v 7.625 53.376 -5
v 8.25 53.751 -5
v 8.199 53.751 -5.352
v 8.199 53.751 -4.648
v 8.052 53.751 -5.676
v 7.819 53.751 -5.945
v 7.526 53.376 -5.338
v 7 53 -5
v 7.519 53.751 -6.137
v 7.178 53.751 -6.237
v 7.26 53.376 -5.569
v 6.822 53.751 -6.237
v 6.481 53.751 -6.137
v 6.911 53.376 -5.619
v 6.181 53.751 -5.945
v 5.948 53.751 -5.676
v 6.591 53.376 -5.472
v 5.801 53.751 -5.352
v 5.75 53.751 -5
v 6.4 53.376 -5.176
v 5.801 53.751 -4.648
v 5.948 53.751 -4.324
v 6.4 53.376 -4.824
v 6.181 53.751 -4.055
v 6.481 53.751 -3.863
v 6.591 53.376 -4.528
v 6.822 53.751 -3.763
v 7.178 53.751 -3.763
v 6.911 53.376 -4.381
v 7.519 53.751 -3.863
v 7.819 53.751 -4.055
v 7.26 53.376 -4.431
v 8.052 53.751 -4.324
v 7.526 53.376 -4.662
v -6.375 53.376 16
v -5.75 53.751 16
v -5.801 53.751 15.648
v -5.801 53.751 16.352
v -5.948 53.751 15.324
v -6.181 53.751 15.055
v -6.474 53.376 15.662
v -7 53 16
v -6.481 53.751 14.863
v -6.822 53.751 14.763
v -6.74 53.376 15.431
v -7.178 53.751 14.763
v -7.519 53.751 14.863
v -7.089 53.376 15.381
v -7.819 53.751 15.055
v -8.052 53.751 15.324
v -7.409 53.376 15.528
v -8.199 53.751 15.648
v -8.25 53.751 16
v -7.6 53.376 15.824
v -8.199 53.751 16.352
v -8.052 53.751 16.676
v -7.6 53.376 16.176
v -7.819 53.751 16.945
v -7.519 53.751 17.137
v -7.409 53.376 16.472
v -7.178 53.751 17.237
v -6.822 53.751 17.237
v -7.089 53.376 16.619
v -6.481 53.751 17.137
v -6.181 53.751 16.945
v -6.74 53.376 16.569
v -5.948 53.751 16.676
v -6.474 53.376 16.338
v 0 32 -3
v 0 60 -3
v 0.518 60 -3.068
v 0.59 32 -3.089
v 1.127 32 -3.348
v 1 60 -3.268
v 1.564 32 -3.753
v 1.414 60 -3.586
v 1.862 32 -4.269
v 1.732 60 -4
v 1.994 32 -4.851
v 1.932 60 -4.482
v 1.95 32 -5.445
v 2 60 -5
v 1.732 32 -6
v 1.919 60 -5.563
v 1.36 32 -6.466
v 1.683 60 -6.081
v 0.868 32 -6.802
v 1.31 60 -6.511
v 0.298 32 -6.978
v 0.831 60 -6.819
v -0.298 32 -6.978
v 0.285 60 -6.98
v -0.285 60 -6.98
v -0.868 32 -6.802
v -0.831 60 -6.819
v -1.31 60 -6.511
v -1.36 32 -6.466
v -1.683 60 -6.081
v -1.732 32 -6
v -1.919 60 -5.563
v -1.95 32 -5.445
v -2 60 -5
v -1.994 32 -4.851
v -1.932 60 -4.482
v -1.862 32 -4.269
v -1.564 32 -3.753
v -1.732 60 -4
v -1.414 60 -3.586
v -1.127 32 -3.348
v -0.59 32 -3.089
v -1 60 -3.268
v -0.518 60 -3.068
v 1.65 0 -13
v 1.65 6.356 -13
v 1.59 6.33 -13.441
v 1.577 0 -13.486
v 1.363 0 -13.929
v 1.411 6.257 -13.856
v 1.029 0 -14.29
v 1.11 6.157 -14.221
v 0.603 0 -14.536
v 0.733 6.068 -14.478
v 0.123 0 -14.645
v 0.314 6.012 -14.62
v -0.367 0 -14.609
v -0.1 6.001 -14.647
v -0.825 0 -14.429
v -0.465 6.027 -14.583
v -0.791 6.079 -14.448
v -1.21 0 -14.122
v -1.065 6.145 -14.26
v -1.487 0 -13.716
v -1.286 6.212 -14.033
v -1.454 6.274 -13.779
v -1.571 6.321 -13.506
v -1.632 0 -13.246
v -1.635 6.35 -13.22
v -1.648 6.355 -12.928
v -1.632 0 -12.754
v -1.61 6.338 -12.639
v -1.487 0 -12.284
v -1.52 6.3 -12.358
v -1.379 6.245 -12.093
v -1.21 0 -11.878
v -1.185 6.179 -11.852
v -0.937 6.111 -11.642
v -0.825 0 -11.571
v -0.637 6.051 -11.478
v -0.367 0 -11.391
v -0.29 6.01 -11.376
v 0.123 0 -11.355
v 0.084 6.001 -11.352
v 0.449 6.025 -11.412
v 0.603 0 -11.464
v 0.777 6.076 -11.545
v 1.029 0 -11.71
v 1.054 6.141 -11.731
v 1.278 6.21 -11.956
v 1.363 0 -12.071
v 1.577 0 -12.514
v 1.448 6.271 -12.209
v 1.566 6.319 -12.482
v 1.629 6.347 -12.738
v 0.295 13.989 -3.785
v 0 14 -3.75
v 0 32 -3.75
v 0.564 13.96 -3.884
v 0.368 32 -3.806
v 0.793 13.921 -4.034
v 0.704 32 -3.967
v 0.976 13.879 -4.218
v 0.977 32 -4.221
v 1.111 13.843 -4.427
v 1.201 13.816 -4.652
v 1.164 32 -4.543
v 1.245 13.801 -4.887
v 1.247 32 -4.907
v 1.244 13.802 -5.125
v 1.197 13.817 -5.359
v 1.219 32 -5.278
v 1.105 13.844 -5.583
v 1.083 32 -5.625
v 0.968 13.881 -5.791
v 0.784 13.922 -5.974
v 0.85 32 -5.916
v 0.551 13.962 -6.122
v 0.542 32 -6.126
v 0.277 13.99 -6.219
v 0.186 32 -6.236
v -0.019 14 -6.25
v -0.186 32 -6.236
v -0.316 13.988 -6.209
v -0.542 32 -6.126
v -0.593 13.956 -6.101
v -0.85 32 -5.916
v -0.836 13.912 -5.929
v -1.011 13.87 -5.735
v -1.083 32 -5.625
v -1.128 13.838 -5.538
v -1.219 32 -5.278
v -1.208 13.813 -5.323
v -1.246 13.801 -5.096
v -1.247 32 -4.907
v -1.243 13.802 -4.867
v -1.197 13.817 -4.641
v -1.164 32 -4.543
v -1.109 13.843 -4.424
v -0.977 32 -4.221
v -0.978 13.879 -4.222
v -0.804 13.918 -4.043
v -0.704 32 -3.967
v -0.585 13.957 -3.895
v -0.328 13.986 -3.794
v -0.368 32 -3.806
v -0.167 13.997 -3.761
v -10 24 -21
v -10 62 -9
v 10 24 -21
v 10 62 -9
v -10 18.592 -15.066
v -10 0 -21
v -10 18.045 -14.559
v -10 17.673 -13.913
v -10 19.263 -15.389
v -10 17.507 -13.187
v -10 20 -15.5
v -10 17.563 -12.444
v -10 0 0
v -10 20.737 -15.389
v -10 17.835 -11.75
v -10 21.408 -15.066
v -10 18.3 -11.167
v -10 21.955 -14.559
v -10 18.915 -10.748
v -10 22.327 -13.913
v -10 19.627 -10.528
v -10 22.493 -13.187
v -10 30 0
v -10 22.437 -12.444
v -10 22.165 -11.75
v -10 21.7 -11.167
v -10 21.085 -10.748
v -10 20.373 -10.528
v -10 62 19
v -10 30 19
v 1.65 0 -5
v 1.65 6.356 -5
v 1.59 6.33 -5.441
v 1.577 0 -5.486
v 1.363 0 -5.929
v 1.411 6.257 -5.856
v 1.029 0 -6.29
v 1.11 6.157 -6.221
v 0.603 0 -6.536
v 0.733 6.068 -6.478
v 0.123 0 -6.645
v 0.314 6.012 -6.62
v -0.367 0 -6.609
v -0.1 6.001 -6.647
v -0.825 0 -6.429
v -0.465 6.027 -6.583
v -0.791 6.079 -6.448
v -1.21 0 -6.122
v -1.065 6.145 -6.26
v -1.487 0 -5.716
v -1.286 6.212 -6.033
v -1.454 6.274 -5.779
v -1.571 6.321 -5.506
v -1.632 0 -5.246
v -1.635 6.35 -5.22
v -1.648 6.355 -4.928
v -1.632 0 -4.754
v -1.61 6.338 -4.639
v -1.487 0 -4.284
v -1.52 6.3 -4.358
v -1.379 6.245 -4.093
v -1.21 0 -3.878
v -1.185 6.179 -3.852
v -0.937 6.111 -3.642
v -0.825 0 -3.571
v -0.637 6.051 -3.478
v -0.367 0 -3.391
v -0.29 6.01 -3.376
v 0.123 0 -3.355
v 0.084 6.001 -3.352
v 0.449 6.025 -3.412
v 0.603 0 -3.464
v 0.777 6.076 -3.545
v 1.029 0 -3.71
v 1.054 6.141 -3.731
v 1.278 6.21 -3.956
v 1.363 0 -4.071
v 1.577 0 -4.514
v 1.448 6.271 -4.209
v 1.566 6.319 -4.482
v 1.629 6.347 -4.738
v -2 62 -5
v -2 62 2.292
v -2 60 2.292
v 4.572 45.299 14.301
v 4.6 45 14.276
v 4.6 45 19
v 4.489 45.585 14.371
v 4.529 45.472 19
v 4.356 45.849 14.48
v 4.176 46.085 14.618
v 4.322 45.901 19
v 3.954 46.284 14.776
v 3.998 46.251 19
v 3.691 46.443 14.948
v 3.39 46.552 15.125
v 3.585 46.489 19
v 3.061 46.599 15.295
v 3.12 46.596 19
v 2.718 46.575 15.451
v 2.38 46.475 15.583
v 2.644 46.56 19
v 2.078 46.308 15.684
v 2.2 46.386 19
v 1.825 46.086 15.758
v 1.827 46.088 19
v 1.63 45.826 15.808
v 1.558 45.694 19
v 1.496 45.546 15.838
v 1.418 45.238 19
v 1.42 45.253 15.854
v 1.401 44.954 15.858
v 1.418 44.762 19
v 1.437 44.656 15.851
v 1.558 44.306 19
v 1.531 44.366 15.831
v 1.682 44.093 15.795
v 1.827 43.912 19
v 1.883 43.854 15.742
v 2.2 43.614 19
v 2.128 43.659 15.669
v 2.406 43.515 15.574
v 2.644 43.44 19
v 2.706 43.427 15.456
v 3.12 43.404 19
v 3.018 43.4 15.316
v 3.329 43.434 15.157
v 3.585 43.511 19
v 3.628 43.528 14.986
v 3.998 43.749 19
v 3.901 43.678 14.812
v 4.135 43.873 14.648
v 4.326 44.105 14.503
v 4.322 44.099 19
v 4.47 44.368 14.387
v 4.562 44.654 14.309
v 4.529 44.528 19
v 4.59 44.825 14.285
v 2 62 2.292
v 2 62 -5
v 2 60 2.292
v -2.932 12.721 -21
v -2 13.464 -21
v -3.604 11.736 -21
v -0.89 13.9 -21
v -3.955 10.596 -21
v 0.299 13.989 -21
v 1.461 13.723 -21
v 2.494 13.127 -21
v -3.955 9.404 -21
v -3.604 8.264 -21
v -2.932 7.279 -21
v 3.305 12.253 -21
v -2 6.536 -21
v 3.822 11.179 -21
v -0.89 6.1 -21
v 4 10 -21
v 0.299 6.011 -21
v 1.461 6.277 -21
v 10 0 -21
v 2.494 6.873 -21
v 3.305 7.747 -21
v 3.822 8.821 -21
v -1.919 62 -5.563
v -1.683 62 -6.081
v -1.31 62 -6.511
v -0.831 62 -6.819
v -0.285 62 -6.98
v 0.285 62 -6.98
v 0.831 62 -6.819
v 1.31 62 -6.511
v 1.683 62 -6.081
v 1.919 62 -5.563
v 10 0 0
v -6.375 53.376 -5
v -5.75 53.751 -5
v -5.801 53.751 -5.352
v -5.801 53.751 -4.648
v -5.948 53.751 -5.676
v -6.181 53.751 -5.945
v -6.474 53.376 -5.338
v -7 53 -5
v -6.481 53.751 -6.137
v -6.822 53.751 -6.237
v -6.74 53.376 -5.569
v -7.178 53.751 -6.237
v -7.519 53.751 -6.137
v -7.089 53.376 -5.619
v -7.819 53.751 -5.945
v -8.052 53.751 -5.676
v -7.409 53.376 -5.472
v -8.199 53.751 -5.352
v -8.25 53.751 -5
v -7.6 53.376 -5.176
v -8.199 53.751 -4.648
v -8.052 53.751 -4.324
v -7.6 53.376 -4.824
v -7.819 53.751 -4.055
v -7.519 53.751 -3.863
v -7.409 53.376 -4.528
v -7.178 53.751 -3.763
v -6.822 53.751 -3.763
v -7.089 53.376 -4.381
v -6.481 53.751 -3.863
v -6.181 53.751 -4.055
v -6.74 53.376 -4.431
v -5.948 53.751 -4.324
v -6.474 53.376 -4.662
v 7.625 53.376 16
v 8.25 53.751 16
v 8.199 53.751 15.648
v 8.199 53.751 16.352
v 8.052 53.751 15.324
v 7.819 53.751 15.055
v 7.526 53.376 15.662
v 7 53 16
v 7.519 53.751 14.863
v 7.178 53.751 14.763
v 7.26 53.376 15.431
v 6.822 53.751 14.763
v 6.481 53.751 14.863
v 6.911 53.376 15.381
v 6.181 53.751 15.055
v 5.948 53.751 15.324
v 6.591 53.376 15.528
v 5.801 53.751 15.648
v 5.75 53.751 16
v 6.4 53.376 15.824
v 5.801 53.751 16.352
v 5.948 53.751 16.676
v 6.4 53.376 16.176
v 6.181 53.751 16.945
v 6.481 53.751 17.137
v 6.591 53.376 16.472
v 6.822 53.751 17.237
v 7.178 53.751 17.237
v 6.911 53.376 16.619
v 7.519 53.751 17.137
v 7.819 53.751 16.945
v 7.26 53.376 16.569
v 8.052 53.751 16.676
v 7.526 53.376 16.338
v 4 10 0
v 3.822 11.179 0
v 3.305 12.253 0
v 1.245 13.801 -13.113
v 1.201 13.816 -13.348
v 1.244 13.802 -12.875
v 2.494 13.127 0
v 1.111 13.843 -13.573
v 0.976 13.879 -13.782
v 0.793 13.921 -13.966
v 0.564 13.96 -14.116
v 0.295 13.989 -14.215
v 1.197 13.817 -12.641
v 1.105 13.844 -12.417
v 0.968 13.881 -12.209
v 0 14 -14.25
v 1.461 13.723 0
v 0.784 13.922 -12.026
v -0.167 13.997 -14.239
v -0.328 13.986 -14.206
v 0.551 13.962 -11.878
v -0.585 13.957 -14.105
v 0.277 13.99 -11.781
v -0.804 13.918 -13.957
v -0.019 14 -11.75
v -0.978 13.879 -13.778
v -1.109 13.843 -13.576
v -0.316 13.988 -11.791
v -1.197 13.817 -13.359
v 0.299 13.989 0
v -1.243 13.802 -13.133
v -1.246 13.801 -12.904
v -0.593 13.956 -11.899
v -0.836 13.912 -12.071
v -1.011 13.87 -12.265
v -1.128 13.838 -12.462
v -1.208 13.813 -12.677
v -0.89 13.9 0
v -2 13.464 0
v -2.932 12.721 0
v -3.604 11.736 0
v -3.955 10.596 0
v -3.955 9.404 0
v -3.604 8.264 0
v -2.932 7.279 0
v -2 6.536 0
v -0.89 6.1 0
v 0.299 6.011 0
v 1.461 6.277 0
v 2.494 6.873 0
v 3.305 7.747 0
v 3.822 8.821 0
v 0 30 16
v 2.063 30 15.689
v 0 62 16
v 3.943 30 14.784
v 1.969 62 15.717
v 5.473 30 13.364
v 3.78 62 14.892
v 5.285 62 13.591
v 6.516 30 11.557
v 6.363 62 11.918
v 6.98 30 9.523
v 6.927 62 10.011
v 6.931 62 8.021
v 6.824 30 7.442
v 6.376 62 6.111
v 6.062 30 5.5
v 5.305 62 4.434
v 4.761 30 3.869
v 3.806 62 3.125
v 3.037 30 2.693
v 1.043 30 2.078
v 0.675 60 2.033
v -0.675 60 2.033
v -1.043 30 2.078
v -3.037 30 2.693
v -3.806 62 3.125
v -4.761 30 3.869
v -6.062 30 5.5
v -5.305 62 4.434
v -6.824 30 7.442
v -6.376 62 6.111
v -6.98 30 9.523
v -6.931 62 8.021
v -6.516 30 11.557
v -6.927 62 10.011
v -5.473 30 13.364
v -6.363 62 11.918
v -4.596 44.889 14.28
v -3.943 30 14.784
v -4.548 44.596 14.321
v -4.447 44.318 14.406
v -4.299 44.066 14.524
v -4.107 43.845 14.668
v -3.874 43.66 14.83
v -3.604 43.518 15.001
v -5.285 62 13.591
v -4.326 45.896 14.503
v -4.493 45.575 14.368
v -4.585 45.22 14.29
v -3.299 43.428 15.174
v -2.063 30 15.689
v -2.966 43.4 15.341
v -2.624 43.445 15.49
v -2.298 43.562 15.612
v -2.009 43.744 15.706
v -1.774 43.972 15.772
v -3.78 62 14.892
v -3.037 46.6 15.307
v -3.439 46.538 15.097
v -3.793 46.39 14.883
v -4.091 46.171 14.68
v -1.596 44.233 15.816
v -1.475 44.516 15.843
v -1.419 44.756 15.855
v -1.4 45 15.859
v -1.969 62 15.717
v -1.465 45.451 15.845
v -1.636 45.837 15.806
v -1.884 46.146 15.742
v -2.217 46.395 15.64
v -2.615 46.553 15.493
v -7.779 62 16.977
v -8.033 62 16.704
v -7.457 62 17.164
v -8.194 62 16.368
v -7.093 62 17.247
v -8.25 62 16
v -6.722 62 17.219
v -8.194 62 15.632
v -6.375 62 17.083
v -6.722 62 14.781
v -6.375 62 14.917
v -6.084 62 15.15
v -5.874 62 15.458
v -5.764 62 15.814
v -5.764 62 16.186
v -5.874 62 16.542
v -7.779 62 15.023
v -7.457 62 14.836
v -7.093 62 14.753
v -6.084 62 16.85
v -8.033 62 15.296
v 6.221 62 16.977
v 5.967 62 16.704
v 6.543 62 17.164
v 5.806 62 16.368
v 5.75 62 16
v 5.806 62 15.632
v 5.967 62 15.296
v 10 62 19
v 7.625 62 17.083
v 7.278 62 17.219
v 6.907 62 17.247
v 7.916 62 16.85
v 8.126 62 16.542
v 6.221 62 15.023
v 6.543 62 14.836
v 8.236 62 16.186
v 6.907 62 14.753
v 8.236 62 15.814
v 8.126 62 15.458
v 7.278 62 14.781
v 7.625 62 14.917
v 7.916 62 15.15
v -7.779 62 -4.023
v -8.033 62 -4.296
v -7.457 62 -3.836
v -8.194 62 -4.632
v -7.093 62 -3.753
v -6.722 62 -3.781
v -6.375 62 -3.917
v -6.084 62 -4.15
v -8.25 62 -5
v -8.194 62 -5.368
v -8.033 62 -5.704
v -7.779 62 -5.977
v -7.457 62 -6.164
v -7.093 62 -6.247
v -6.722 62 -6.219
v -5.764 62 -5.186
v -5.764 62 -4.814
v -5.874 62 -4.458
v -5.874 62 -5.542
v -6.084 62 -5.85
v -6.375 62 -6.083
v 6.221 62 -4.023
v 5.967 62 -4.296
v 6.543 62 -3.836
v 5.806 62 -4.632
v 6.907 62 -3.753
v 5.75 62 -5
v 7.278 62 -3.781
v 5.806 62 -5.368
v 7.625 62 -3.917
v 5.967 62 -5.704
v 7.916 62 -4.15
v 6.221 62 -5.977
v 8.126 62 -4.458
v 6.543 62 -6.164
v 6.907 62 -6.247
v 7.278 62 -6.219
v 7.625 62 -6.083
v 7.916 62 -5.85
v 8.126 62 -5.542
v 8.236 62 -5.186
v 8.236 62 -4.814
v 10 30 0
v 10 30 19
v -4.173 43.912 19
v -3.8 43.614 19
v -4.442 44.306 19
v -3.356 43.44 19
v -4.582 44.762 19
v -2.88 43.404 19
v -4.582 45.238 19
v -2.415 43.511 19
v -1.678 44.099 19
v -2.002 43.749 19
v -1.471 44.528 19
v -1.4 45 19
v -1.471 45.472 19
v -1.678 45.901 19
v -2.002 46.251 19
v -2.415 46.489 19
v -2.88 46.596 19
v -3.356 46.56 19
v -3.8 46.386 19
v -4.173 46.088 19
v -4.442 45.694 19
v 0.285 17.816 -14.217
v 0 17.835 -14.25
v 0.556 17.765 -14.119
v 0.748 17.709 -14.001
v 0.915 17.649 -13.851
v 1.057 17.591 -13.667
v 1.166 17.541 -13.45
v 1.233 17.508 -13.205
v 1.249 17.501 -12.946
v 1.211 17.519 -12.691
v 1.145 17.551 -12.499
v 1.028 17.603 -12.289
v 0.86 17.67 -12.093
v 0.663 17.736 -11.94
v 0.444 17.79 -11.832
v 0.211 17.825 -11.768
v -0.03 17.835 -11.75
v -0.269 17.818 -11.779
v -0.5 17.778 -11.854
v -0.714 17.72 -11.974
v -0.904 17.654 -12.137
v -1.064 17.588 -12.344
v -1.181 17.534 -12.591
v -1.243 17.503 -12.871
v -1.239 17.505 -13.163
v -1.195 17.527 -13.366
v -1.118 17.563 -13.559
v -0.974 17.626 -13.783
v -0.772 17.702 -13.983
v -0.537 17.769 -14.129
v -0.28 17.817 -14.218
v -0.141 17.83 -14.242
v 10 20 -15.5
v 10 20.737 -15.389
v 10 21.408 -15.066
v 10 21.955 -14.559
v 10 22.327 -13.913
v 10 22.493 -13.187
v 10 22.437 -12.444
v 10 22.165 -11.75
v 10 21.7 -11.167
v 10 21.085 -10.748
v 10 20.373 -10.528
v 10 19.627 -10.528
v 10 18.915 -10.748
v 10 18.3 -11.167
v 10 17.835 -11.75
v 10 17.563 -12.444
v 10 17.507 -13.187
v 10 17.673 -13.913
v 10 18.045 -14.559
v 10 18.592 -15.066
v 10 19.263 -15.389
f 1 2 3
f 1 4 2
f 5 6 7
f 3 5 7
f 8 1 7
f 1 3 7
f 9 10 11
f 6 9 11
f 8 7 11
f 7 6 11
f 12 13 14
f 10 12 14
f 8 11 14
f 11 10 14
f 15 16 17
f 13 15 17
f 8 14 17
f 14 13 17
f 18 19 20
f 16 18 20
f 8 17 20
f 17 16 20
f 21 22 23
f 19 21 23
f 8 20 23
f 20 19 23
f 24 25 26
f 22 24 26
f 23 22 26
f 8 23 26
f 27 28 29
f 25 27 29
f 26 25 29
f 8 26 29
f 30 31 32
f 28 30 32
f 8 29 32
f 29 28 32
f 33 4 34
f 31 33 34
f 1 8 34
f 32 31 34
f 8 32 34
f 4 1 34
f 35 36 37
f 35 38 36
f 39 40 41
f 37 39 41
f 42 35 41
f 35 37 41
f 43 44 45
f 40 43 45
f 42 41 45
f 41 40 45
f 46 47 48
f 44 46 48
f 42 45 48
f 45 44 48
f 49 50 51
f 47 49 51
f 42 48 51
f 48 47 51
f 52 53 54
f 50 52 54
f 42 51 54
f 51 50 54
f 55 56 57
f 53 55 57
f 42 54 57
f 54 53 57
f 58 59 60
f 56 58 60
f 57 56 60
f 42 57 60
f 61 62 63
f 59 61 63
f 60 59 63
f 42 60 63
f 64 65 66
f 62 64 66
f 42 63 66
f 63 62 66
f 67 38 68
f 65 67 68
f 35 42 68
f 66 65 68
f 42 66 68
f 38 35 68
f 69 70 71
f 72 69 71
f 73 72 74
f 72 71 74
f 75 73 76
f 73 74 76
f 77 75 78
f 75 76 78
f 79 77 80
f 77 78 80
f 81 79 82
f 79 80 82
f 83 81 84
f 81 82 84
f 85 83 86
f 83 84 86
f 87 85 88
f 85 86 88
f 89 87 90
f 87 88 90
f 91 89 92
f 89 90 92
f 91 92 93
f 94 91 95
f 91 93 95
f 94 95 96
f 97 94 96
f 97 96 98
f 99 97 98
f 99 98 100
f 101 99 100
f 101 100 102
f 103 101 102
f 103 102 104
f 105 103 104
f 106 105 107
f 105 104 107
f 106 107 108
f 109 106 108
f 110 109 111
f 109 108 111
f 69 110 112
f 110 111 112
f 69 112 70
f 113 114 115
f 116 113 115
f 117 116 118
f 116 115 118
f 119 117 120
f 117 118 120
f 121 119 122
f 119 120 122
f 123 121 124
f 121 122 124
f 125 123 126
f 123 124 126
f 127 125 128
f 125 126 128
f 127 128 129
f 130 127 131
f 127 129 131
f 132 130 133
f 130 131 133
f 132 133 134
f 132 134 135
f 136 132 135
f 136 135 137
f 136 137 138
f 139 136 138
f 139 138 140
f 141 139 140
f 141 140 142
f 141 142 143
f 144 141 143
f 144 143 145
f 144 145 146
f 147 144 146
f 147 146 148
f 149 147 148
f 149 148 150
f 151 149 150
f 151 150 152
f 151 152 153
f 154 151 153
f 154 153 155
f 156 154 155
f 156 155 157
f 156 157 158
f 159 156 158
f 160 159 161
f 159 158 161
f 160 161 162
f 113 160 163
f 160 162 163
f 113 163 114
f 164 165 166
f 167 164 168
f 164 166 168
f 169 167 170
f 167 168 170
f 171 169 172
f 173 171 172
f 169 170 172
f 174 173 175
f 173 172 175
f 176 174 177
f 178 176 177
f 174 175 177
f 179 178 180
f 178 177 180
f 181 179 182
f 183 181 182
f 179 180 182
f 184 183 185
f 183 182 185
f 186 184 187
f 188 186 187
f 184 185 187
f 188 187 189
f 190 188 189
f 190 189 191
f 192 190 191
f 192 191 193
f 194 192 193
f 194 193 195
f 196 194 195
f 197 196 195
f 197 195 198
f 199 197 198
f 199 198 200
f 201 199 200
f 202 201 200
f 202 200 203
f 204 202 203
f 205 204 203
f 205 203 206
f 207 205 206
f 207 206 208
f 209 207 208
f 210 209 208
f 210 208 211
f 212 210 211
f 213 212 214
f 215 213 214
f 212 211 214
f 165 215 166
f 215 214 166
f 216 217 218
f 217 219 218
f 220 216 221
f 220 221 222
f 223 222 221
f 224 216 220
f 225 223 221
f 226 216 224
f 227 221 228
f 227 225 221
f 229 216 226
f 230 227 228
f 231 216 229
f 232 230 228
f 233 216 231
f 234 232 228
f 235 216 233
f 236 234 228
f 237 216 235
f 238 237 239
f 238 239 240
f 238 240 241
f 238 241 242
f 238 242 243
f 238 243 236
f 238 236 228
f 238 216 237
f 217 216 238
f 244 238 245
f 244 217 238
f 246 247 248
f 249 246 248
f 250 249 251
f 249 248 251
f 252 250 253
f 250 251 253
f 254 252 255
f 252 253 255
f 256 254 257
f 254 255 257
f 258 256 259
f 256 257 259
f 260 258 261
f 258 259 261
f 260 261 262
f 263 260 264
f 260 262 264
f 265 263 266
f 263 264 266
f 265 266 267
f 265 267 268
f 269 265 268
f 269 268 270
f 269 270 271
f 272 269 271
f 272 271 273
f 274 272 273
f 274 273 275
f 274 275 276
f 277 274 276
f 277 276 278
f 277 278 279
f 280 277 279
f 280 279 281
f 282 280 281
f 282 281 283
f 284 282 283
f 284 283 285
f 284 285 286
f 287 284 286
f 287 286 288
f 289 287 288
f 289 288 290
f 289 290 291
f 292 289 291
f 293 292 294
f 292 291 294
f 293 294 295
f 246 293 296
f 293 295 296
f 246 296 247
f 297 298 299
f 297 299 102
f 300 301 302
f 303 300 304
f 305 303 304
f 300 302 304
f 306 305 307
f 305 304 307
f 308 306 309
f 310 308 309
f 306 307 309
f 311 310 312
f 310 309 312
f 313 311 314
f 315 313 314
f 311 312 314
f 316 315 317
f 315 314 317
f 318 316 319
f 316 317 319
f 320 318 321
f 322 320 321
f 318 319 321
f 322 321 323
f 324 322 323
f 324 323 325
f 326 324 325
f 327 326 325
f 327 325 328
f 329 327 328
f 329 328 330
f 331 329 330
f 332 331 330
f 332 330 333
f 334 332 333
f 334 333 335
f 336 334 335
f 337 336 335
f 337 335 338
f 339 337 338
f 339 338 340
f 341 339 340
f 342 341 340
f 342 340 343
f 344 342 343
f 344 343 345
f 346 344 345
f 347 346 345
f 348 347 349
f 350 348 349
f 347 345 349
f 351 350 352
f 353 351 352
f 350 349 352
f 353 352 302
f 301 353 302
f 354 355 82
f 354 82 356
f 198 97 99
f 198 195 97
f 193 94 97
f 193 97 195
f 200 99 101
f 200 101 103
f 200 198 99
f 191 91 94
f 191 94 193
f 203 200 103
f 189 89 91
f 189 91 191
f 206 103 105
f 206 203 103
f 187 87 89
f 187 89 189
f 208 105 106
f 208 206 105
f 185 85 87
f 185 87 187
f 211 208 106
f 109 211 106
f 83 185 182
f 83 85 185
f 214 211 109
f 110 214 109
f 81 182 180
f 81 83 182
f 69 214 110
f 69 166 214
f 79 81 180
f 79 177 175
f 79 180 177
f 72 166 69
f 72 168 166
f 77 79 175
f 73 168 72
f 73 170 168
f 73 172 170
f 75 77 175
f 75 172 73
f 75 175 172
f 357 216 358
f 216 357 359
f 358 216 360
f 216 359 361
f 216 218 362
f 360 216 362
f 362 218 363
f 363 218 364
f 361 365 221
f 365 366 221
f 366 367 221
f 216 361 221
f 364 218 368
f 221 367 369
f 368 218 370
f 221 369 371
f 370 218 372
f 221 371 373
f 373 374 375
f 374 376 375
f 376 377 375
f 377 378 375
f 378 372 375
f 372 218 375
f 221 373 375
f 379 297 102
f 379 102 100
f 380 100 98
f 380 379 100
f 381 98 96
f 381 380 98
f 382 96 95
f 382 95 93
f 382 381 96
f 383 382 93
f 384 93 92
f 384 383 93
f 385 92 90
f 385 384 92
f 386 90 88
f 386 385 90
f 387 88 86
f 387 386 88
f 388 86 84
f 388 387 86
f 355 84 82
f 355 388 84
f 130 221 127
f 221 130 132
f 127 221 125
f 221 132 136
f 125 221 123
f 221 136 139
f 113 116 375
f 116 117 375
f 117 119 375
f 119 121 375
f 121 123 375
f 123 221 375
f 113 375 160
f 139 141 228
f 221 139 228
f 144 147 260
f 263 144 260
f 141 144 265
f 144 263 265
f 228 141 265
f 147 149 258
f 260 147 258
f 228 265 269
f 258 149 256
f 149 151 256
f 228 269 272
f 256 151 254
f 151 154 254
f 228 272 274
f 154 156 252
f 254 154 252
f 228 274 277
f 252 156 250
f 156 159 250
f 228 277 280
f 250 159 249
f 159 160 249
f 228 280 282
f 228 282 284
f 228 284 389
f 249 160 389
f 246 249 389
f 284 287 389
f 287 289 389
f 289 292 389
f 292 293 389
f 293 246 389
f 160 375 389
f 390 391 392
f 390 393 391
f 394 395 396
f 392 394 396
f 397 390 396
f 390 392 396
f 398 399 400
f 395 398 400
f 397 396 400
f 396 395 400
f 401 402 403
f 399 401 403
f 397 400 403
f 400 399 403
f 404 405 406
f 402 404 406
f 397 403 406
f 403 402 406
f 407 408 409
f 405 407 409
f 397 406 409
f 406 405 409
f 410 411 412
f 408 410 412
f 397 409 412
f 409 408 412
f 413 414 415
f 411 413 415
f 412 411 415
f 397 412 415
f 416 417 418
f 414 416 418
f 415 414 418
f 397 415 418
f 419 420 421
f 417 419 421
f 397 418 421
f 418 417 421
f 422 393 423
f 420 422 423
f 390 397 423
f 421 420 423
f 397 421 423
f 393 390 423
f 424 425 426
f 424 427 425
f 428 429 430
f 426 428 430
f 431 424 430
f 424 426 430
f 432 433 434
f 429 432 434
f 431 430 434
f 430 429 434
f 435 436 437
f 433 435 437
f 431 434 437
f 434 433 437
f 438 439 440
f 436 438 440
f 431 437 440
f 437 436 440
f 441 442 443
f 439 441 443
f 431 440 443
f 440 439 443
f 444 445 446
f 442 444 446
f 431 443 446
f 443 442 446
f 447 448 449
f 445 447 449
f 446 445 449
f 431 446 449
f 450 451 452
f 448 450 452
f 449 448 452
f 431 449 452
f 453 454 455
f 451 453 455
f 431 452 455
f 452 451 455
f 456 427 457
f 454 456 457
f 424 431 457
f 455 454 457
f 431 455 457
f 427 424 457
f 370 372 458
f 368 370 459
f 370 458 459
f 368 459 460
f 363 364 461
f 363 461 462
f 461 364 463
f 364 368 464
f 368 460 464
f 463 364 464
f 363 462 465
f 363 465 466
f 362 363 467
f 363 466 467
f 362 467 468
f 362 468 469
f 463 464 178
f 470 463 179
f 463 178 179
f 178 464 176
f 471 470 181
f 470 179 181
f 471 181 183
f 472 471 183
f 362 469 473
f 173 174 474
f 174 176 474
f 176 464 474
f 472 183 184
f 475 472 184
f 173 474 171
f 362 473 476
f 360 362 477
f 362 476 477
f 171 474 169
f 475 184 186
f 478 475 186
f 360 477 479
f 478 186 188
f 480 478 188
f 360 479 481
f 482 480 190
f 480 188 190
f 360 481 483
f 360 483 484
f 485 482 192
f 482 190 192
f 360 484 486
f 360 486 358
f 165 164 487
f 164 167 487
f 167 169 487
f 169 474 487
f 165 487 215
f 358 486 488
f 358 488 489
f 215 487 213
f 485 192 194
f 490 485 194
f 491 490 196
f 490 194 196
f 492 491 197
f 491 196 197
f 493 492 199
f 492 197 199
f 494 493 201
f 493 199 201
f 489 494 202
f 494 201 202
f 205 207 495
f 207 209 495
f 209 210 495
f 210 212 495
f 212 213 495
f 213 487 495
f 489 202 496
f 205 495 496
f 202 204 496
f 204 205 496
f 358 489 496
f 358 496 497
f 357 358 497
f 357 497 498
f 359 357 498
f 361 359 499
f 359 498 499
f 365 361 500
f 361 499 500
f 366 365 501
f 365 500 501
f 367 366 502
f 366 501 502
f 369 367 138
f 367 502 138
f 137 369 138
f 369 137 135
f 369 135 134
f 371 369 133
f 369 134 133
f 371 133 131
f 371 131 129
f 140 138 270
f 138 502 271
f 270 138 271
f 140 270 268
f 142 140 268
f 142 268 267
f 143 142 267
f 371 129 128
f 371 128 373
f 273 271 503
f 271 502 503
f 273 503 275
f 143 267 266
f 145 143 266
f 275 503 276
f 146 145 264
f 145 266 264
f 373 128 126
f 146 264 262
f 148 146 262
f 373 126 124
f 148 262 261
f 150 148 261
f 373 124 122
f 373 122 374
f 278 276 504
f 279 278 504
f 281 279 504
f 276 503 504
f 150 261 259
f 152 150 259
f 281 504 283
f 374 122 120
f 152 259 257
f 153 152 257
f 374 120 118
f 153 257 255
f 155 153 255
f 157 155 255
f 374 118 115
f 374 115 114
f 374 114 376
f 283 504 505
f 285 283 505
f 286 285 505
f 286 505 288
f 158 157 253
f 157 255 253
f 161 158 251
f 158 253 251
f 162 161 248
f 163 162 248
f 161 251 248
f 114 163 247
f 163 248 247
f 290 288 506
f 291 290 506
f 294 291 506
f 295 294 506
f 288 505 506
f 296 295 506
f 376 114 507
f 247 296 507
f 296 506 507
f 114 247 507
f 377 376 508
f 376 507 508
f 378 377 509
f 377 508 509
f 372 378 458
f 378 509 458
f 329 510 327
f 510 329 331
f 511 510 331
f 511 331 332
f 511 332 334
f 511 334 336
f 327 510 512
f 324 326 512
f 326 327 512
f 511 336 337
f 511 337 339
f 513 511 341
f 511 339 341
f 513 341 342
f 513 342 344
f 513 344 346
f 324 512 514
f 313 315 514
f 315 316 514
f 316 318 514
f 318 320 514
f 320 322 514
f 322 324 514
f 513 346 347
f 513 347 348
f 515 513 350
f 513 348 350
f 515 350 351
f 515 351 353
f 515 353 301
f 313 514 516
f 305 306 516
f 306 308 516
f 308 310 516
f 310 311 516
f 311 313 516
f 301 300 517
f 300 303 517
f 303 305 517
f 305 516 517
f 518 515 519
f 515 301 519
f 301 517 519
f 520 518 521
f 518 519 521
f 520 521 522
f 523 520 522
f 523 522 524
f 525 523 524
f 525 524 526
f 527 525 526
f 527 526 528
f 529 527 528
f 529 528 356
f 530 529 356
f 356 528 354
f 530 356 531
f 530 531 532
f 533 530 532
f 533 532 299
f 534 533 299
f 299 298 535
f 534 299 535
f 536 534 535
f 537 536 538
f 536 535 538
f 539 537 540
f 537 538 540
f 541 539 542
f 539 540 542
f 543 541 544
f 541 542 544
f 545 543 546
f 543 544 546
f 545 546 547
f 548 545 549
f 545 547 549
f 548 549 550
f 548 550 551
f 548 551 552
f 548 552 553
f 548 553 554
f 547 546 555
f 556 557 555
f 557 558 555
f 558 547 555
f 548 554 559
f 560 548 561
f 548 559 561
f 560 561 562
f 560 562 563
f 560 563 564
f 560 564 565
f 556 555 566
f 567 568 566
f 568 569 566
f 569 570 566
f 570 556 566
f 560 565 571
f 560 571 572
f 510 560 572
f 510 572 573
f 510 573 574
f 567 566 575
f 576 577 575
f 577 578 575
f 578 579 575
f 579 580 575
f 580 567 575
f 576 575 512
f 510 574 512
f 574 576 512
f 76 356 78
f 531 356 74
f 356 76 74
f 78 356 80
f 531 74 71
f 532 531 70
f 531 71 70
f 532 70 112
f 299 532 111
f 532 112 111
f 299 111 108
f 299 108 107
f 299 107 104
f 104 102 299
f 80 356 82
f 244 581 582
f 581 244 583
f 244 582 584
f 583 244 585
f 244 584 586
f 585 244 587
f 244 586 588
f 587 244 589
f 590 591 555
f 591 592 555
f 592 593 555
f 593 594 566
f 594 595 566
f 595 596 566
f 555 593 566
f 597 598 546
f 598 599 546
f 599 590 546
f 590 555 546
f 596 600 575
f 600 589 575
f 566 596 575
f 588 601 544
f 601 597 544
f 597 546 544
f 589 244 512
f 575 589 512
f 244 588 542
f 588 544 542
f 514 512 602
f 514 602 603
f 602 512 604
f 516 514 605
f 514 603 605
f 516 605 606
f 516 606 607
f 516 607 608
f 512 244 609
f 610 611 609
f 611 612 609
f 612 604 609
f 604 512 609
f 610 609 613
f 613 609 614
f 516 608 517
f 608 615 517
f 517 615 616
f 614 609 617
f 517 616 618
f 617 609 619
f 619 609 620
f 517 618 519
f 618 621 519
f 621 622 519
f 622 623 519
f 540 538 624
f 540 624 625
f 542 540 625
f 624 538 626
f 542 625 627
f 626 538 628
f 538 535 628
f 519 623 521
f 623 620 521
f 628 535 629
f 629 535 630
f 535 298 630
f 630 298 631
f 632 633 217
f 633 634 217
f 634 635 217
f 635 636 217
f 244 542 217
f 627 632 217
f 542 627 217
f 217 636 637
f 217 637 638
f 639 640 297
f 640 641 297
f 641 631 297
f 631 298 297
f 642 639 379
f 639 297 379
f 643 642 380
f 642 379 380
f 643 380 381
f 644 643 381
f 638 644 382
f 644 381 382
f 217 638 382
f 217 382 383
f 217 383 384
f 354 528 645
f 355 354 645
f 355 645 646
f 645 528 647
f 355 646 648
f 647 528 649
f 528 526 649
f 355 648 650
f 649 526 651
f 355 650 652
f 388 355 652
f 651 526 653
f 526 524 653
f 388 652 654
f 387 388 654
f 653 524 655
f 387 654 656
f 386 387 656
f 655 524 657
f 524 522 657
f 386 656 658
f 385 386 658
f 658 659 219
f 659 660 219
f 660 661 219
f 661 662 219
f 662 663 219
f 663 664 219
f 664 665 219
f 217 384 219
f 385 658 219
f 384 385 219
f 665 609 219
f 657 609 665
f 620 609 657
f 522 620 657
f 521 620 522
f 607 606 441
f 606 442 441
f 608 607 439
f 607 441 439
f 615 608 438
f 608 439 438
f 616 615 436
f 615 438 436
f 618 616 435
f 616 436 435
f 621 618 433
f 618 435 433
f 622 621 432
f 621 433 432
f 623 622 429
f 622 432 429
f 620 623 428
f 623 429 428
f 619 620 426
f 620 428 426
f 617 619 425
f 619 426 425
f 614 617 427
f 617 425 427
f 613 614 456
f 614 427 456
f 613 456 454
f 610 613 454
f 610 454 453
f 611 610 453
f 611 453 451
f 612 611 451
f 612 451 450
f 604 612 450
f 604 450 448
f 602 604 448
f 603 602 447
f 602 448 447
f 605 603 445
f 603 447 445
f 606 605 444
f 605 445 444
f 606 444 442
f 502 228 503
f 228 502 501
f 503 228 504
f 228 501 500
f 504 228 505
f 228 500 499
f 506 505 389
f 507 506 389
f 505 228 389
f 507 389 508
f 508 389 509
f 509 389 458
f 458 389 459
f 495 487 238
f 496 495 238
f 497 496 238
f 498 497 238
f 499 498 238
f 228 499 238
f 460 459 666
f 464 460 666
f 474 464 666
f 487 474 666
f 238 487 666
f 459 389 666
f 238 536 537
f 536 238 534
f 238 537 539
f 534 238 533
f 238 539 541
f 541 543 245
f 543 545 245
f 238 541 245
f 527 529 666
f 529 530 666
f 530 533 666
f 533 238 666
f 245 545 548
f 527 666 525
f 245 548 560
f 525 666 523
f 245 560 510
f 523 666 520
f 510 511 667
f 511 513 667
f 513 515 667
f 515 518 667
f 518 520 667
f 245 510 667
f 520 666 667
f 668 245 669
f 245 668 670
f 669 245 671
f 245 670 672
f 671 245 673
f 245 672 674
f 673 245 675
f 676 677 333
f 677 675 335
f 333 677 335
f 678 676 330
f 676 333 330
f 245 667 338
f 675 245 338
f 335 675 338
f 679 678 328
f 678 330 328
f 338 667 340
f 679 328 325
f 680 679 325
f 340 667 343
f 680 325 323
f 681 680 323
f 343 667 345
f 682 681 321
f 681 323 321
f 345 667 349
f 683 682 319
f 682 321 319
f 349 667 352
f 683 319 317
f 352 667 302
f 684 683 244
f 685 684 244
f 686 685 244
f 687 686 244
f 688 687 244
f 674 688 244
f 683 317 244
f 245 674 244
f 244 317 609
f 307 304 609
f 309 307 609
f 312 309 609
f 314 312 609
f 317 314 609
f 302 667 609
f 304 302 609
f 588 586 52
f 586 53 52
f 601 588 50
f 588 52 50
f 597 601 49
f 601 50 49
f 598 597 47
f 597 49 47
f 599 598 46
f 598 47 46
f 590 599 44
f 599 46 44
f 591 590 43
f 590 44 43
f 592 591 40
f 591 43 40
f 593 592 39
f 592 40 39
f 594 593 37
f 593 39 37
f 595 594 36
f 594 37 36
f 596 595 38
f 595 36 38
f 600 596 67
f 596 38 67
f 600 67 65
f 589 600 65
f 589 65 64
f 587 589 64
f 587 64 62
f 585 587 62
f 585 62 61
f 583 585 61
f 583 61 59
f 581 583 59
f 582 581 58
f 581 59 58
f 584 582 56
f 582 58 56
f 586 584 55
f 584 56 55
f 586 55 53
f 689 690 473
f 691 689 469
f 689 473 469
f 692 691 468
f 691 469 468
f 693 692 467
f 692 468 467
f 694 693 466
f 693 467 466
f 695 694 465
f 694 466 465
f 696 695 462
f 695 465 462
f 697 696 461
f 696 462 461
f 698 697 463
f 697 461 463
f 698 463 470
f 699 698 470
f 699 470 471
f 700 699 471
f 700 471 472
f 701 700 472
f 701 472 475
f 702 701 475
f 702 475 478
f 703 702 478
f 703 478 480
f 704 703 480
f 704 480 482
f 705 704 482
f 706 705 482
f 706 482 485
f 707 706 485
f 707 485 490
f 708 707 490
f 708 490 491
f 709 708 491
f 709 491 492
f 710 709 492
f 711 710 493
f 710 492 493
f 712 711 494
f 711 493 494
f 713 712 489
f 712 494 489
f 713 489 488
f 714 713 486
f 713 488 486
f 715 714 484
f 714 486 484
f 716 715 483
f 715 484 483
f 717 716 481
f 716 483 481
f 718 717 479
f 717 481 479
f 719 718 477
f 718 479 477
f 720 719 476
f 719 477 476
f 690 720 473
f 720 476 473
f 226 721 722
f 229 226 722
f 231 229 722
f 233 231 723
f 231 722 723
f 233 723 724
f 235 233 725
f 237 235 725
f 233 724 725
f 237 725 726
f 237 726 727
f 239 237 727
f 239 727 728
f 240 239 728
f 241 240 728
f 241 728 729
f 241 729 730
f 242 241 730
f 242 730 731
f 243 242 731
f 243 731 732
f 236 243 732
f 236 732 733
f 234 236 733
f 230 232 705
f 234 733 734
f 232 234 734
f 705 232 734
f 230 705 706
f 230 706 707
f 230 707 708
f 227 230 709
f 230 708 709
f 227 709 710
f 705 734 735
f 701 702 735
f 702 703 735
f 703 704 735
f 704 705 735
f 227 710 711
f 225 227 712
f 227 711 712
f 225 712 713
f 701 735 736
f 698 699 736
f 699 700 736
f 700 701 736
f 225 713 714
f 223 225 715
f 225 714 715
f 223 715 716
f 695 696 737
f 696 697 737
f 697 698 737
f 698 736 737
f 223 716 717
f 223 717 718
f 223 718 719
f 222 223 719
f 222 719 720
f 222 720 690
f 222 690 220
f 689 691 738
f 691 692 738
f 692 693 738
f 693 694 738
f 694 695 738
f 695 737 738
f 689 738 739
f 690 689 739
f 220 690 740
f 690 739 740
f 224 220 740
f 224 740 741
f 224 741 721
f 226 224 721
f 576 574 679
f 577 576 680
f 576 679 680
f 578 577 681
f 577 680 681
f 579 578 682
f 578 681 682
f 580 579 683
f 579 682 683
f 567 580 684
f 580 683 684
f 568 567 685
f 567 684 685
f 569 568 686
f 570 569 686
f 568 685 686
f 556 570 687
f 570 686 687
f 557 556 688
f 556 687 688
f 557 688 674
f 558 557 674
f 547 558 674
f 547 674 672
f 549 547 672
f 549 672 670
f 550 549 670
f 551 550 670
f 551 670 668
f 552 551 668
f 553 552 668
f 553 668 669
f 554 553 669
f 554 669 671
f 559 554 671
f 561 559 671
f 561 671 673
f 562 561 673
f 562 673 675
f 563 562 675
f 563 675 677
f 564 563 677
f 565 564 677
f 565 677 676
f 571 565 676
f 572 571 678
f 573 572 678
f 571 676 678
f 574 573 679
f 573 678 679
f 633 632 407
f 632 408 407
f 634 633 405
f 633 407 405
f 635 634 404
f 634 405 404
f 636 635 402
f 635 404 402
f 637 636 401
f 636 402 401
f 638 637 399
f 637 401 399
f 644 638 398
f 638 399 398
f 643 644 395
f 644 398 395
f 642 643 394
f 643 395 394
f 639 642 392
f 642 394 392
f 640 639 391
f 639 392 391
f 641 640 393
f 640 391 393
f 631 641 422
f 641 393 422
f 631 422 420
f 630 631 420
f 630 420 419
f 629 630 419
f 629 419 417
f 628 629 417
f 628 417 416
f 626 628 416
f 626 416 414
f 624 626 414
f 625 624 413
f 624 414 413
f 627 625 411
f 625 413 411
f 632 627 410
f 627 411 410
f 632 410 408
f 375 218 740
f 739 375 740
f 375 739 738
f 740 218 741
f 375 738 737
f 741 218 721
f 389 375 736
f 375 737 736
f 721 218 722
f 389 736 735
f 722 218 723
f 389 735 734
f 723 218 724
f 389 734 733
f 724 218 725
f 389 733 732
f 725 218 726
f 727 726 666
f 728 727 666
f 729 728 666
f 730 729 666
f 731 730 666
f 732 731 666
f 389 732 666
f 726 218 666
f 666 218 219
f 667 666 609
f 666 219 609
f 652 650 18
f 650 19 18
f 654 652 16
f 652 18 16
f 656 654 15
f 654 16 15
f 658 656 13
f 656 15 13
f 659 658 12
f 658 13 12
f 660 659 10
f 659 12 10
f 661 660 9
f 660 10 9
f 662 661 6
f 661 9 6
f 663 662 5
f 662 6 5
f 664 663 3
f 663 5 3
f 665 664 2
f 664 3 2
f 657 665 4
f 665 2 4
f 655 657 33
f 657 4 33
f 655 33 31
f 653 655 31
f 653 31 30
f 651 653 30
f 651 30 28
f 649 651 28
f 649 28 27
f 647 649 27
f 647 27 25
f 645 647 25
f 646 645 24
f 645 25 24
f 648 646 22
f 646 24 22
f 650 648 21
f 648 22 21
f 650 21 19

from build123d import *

# Parameters (mm, degrees)
BOSS_EXTRUDE1_DEPTH     = 10
SKETCH2_R               = 7
CUT_EXTRUDE1_DEPTH      = 67.219332525
M3_TAPPED_HOLE1_D       = 2.5
M3_TAPPED_HOLE1_DEPTH   = 8.248924226
M3_TAPPED_HOLE1_TIP     = 0.751075774
CUT_EXTRUDE2_DEPTH      = 2
SKETCH7_R               = 2
CUT_EXTRUDE3_DEPTH      = 30
SKETCH8_R               = 1.25
CUT_EXTRUDE4_DEPTH      = 49
CUT_EXTRUDE5_REACH      = 76.458
CUT_EXTRUDE5_END_RADIUS = 7
SKETCH9_R               = 1.6
SKETCH10_R              = 2.5
CUT_EXTRUDE6_DEPTH      = 69.447059925
CUT_EXTRUDE7_REACH      = 68.219
CUT_EXTRUDE7_END_RADIUS = 2.5
SKETCH11_R              = 1.25
CUT_EXTRUDE8_REACH      = 68.219
SKETCH12_R              = 4
M4_TAPPED_HOLE1_D       = 3.3
M4_TAPPED_HOLE1_DEPTH   = 9.008579979
M4_TAPPED_HOLE1_TIP     = 0.991420021


with BuildPart() as part:
    # Sketch1 → Boss-Extrude1 (new, symmetric)
    with BuildSketch(Plane(origin=(0, 0, 0), x_dir=(0, 0, -1), z_dir=(1, 0, 0))):
        Polygon((0, 0), (0, 30), (-19, 30), (-19, 62), (9, 62), (21, 24), (21, 0), align=None)
    extrude(amount=BOSS_EXTRUDE1_DEPTH, both=True)

    # Sketch2 → Cut-Extrude1 (cut, through all)
    with BuildSketch(Plane(origin=(0, 62, 0), x_dir=(1, 0, 0), z_dir=(0, 1, 0))):
        with Locations(Location((0, -9, 0), (0, 0, 270))):
            Circle(SKETCH2_R)
    extrude(amount=-CUT_EXTRUDE1_DEPTH, mode=Mode.SUBTRACT)

    # M3 Tapped Hole1
    with Locations(Plane(origin=(0, 62, 0), x_dir=(1, 0, 0), z_dir=(0, 1, 0))):
        with Locations((-7, -16), (7, -16), (7, 5), (-7, 5)):
            Hole(M3_TAPPED_HOLE1_D / 2, depth=M3_TAPPED_HOLE1_DEPTH)
            with Locations((0, 0, -(M3_TAPPED_HOLE1_DEPTH + M3_TAPPED_HOLE1_TIP / 2))):  # 118° drill point
                Cone(0, M3_TAPPED_HOLE1_D / 2, M3_TAPPED_HOLE1_TIP, mode=Mode.SUBTRACT)

    # Sketch6 → Cut-Extrude2 (cut)
    with BuildSketch(Plane(origin=(0, 62, 0), x_dir=(1, 0, 0), z_dir=(0, 1, 0))):
        with BuildLine():
            Line((2, 5), (2, -4.41407825))
            ThreePointArc((2, -4.41407825), (0, -6.41407825), (-2, -4.41407825))
            Line((-2, -4.41407825), (-2, 5))
            ThreePointArc((-2, 5), (0, 7), (2, 5))
        make_face()
    extrude(amount=-CUT_EXTRUDE2_DEPTH, mode=Mode.SUBTRACT)

    # Sketch7 → Cut-Extrude3 (cut)
    with BuildSketch(Plane(origin=(0, 62, 0), x_dir=(1, 0, 0), z_dir=(0, 1, 0))):
        with Locations(Location((0, 5, 0), (0, 0, 270))):
            Circle(SKETCH7_R)
    extrude(amount=-CUT_EXTRUDE3_DEPTH, mode=Mode.SUBTRACT)

    # Sketch8 → Cut-Extrude4 (cut)
    with BuildSketch(Plane(origin=(0, 62, 0), x_dir=(1, 0, 0), z_dir=(0, 1, 0))):
        with Locations(Location((0, 5, 0), (0, 0, 270))):
            Circle(SKETCH8_R)
    extrude(amount=-CUT_EXTRUDE4_DEPTH, mode=Mode.SUBTRACT)

    # Cut-Extrude5: up to this cylinder (the profile starts outside it)
    cut_extrude5_end = Plane(origin=(0, 45, 9), z_dir=(0, 1, 0)) * Cylinder(CUT_EXTRUDE5_END_RADIUS, 167.916, mode=Mode.PRIVATE)
    # Sketch9 → Cut-Extrude5 (cut, up to the surface)
    with BuildSketch(Plane.XY.offset(19), mode=Mode.PRIVATE) as cut_extrude5_sk1:
        with Locations((-3, 45)):
            Circle(SKETCH9_R)
    cut_extrude5_tool1 = extrude(cut_extrude5_sk1.sketch, amount=-CUT_EXTRUDE5_REACH, mode=Mode.PRIVATE) - cut_extrude5_end
    add(cut_extrude5_tool1.solids().sort_by_distance((-3, 45, 19))[0], mode=Mode.SUBTRACT)
    # Sketch9 → Cut-Extrude5 (cut, up to the surface)
    with BuildSketch(Plane.XY.offset(19), mode=Mode.PRIVATE) as cut_extrude5_sk2:
        with Locations((3, 45)):
            Circle(SKETCH9_R)
    cut_extrude5_tool2 = extrude(cut_extrude5_sk2.sketch, amount=-CUT_EXTRUDE5_REACH, mode=Mode.PRIVATE) - cut_extrude5_end
    add(cut_extrude5_tool2.solids().sort_by_distance((3, 45, 19))[0], mode=Mode.SUBTRACT)

    # Sketch10 → Cut-Extrude6 (cut, through all)
    with BuildSketch(Plane(origin=(10, 0, 0), x_dir=(0, 0, -1), z_dir=(1, 0, 0))):
        with Locations((13, 20)):
            Circle(SKETCH10_R)
    extrude(amount=-CUT_EXTRUDE6_DEPTH, mode=Mode.SUBTRACT)

    # Cut-Extrude7: up to this cylinder (the profile starts outside it)
    cut_extrude7_end = Plane(origin=(0, 20, -13), z_dir=(1, 0, 0)) * Cylinder(CUT_EXTRUDE7_END_RADIUS, 142.438, mode=Mode.PRIVATE)
    # Sketch11 → Cut-Extrude7 (cut, up to the surface)
    with BuildSketch(Plane.XZ, mode=Mode.PRIVATE) as cut_extrude7_sk1:
        with Locations(Location((0, -13, 0), (0, 0, 270))):
            Circle(SKETCH11_R)
    cut_extrude7_tool1 = extrude(cut_extrude7_sk1.sketch, amount=-CUT_EXTRUDE7_REACH, mode=Mode.PRIVATE) - cut_extrude7_end
    add(cut_extrude7_tool1.solids().sort_by_distance((0, 0, -13))[0], mode=Mode.SUBTRACT)

    # Sketch12 → Cut-Extrude8 (cut, up to next)
    with BuildSketch(Plane.XY, mode=Mode.PRIVATE) as cut_extrude8_sk1:
        with Locations((0, 10)):
            Circle(SKETCH12_R)
    cut_extrude8_tool1 = extrude(cut_extrude8_sk1.sketch, amount=-CUT_EXTRUDE8_REACH, mode=Mode.PRIVATE) & part.part
    add(cut_extrude8_tool1.solids().sort_by_distance((0, 10, 0))[0], mode=Mode.SUBTRACT)

    # M4 Tapped Hole1
    with Locations(Plane(origin=(0, 0, 0), x_dir=(-1, 0, 0), z_dir=(0, -1, 0))):
        with Locations((0, 13), (0, 5)):
            Hole(M4_TAPPED_HOLE1_D / 2, depth=M4_TAPPED_HOLE1_DEPTH)
            with Locations((0, 0, -(M4_TAPPED_HOLE1_DEPTH + M4_TAPPED_HOLE1_TIP / 2))):  # 118° drill point
                Cone(0, M4_TAPPED_HOLE1_D / 2, M4_TAPPED_HOLE1_TIP, mode=Mode.SUBTRACT)


solid = part.part
